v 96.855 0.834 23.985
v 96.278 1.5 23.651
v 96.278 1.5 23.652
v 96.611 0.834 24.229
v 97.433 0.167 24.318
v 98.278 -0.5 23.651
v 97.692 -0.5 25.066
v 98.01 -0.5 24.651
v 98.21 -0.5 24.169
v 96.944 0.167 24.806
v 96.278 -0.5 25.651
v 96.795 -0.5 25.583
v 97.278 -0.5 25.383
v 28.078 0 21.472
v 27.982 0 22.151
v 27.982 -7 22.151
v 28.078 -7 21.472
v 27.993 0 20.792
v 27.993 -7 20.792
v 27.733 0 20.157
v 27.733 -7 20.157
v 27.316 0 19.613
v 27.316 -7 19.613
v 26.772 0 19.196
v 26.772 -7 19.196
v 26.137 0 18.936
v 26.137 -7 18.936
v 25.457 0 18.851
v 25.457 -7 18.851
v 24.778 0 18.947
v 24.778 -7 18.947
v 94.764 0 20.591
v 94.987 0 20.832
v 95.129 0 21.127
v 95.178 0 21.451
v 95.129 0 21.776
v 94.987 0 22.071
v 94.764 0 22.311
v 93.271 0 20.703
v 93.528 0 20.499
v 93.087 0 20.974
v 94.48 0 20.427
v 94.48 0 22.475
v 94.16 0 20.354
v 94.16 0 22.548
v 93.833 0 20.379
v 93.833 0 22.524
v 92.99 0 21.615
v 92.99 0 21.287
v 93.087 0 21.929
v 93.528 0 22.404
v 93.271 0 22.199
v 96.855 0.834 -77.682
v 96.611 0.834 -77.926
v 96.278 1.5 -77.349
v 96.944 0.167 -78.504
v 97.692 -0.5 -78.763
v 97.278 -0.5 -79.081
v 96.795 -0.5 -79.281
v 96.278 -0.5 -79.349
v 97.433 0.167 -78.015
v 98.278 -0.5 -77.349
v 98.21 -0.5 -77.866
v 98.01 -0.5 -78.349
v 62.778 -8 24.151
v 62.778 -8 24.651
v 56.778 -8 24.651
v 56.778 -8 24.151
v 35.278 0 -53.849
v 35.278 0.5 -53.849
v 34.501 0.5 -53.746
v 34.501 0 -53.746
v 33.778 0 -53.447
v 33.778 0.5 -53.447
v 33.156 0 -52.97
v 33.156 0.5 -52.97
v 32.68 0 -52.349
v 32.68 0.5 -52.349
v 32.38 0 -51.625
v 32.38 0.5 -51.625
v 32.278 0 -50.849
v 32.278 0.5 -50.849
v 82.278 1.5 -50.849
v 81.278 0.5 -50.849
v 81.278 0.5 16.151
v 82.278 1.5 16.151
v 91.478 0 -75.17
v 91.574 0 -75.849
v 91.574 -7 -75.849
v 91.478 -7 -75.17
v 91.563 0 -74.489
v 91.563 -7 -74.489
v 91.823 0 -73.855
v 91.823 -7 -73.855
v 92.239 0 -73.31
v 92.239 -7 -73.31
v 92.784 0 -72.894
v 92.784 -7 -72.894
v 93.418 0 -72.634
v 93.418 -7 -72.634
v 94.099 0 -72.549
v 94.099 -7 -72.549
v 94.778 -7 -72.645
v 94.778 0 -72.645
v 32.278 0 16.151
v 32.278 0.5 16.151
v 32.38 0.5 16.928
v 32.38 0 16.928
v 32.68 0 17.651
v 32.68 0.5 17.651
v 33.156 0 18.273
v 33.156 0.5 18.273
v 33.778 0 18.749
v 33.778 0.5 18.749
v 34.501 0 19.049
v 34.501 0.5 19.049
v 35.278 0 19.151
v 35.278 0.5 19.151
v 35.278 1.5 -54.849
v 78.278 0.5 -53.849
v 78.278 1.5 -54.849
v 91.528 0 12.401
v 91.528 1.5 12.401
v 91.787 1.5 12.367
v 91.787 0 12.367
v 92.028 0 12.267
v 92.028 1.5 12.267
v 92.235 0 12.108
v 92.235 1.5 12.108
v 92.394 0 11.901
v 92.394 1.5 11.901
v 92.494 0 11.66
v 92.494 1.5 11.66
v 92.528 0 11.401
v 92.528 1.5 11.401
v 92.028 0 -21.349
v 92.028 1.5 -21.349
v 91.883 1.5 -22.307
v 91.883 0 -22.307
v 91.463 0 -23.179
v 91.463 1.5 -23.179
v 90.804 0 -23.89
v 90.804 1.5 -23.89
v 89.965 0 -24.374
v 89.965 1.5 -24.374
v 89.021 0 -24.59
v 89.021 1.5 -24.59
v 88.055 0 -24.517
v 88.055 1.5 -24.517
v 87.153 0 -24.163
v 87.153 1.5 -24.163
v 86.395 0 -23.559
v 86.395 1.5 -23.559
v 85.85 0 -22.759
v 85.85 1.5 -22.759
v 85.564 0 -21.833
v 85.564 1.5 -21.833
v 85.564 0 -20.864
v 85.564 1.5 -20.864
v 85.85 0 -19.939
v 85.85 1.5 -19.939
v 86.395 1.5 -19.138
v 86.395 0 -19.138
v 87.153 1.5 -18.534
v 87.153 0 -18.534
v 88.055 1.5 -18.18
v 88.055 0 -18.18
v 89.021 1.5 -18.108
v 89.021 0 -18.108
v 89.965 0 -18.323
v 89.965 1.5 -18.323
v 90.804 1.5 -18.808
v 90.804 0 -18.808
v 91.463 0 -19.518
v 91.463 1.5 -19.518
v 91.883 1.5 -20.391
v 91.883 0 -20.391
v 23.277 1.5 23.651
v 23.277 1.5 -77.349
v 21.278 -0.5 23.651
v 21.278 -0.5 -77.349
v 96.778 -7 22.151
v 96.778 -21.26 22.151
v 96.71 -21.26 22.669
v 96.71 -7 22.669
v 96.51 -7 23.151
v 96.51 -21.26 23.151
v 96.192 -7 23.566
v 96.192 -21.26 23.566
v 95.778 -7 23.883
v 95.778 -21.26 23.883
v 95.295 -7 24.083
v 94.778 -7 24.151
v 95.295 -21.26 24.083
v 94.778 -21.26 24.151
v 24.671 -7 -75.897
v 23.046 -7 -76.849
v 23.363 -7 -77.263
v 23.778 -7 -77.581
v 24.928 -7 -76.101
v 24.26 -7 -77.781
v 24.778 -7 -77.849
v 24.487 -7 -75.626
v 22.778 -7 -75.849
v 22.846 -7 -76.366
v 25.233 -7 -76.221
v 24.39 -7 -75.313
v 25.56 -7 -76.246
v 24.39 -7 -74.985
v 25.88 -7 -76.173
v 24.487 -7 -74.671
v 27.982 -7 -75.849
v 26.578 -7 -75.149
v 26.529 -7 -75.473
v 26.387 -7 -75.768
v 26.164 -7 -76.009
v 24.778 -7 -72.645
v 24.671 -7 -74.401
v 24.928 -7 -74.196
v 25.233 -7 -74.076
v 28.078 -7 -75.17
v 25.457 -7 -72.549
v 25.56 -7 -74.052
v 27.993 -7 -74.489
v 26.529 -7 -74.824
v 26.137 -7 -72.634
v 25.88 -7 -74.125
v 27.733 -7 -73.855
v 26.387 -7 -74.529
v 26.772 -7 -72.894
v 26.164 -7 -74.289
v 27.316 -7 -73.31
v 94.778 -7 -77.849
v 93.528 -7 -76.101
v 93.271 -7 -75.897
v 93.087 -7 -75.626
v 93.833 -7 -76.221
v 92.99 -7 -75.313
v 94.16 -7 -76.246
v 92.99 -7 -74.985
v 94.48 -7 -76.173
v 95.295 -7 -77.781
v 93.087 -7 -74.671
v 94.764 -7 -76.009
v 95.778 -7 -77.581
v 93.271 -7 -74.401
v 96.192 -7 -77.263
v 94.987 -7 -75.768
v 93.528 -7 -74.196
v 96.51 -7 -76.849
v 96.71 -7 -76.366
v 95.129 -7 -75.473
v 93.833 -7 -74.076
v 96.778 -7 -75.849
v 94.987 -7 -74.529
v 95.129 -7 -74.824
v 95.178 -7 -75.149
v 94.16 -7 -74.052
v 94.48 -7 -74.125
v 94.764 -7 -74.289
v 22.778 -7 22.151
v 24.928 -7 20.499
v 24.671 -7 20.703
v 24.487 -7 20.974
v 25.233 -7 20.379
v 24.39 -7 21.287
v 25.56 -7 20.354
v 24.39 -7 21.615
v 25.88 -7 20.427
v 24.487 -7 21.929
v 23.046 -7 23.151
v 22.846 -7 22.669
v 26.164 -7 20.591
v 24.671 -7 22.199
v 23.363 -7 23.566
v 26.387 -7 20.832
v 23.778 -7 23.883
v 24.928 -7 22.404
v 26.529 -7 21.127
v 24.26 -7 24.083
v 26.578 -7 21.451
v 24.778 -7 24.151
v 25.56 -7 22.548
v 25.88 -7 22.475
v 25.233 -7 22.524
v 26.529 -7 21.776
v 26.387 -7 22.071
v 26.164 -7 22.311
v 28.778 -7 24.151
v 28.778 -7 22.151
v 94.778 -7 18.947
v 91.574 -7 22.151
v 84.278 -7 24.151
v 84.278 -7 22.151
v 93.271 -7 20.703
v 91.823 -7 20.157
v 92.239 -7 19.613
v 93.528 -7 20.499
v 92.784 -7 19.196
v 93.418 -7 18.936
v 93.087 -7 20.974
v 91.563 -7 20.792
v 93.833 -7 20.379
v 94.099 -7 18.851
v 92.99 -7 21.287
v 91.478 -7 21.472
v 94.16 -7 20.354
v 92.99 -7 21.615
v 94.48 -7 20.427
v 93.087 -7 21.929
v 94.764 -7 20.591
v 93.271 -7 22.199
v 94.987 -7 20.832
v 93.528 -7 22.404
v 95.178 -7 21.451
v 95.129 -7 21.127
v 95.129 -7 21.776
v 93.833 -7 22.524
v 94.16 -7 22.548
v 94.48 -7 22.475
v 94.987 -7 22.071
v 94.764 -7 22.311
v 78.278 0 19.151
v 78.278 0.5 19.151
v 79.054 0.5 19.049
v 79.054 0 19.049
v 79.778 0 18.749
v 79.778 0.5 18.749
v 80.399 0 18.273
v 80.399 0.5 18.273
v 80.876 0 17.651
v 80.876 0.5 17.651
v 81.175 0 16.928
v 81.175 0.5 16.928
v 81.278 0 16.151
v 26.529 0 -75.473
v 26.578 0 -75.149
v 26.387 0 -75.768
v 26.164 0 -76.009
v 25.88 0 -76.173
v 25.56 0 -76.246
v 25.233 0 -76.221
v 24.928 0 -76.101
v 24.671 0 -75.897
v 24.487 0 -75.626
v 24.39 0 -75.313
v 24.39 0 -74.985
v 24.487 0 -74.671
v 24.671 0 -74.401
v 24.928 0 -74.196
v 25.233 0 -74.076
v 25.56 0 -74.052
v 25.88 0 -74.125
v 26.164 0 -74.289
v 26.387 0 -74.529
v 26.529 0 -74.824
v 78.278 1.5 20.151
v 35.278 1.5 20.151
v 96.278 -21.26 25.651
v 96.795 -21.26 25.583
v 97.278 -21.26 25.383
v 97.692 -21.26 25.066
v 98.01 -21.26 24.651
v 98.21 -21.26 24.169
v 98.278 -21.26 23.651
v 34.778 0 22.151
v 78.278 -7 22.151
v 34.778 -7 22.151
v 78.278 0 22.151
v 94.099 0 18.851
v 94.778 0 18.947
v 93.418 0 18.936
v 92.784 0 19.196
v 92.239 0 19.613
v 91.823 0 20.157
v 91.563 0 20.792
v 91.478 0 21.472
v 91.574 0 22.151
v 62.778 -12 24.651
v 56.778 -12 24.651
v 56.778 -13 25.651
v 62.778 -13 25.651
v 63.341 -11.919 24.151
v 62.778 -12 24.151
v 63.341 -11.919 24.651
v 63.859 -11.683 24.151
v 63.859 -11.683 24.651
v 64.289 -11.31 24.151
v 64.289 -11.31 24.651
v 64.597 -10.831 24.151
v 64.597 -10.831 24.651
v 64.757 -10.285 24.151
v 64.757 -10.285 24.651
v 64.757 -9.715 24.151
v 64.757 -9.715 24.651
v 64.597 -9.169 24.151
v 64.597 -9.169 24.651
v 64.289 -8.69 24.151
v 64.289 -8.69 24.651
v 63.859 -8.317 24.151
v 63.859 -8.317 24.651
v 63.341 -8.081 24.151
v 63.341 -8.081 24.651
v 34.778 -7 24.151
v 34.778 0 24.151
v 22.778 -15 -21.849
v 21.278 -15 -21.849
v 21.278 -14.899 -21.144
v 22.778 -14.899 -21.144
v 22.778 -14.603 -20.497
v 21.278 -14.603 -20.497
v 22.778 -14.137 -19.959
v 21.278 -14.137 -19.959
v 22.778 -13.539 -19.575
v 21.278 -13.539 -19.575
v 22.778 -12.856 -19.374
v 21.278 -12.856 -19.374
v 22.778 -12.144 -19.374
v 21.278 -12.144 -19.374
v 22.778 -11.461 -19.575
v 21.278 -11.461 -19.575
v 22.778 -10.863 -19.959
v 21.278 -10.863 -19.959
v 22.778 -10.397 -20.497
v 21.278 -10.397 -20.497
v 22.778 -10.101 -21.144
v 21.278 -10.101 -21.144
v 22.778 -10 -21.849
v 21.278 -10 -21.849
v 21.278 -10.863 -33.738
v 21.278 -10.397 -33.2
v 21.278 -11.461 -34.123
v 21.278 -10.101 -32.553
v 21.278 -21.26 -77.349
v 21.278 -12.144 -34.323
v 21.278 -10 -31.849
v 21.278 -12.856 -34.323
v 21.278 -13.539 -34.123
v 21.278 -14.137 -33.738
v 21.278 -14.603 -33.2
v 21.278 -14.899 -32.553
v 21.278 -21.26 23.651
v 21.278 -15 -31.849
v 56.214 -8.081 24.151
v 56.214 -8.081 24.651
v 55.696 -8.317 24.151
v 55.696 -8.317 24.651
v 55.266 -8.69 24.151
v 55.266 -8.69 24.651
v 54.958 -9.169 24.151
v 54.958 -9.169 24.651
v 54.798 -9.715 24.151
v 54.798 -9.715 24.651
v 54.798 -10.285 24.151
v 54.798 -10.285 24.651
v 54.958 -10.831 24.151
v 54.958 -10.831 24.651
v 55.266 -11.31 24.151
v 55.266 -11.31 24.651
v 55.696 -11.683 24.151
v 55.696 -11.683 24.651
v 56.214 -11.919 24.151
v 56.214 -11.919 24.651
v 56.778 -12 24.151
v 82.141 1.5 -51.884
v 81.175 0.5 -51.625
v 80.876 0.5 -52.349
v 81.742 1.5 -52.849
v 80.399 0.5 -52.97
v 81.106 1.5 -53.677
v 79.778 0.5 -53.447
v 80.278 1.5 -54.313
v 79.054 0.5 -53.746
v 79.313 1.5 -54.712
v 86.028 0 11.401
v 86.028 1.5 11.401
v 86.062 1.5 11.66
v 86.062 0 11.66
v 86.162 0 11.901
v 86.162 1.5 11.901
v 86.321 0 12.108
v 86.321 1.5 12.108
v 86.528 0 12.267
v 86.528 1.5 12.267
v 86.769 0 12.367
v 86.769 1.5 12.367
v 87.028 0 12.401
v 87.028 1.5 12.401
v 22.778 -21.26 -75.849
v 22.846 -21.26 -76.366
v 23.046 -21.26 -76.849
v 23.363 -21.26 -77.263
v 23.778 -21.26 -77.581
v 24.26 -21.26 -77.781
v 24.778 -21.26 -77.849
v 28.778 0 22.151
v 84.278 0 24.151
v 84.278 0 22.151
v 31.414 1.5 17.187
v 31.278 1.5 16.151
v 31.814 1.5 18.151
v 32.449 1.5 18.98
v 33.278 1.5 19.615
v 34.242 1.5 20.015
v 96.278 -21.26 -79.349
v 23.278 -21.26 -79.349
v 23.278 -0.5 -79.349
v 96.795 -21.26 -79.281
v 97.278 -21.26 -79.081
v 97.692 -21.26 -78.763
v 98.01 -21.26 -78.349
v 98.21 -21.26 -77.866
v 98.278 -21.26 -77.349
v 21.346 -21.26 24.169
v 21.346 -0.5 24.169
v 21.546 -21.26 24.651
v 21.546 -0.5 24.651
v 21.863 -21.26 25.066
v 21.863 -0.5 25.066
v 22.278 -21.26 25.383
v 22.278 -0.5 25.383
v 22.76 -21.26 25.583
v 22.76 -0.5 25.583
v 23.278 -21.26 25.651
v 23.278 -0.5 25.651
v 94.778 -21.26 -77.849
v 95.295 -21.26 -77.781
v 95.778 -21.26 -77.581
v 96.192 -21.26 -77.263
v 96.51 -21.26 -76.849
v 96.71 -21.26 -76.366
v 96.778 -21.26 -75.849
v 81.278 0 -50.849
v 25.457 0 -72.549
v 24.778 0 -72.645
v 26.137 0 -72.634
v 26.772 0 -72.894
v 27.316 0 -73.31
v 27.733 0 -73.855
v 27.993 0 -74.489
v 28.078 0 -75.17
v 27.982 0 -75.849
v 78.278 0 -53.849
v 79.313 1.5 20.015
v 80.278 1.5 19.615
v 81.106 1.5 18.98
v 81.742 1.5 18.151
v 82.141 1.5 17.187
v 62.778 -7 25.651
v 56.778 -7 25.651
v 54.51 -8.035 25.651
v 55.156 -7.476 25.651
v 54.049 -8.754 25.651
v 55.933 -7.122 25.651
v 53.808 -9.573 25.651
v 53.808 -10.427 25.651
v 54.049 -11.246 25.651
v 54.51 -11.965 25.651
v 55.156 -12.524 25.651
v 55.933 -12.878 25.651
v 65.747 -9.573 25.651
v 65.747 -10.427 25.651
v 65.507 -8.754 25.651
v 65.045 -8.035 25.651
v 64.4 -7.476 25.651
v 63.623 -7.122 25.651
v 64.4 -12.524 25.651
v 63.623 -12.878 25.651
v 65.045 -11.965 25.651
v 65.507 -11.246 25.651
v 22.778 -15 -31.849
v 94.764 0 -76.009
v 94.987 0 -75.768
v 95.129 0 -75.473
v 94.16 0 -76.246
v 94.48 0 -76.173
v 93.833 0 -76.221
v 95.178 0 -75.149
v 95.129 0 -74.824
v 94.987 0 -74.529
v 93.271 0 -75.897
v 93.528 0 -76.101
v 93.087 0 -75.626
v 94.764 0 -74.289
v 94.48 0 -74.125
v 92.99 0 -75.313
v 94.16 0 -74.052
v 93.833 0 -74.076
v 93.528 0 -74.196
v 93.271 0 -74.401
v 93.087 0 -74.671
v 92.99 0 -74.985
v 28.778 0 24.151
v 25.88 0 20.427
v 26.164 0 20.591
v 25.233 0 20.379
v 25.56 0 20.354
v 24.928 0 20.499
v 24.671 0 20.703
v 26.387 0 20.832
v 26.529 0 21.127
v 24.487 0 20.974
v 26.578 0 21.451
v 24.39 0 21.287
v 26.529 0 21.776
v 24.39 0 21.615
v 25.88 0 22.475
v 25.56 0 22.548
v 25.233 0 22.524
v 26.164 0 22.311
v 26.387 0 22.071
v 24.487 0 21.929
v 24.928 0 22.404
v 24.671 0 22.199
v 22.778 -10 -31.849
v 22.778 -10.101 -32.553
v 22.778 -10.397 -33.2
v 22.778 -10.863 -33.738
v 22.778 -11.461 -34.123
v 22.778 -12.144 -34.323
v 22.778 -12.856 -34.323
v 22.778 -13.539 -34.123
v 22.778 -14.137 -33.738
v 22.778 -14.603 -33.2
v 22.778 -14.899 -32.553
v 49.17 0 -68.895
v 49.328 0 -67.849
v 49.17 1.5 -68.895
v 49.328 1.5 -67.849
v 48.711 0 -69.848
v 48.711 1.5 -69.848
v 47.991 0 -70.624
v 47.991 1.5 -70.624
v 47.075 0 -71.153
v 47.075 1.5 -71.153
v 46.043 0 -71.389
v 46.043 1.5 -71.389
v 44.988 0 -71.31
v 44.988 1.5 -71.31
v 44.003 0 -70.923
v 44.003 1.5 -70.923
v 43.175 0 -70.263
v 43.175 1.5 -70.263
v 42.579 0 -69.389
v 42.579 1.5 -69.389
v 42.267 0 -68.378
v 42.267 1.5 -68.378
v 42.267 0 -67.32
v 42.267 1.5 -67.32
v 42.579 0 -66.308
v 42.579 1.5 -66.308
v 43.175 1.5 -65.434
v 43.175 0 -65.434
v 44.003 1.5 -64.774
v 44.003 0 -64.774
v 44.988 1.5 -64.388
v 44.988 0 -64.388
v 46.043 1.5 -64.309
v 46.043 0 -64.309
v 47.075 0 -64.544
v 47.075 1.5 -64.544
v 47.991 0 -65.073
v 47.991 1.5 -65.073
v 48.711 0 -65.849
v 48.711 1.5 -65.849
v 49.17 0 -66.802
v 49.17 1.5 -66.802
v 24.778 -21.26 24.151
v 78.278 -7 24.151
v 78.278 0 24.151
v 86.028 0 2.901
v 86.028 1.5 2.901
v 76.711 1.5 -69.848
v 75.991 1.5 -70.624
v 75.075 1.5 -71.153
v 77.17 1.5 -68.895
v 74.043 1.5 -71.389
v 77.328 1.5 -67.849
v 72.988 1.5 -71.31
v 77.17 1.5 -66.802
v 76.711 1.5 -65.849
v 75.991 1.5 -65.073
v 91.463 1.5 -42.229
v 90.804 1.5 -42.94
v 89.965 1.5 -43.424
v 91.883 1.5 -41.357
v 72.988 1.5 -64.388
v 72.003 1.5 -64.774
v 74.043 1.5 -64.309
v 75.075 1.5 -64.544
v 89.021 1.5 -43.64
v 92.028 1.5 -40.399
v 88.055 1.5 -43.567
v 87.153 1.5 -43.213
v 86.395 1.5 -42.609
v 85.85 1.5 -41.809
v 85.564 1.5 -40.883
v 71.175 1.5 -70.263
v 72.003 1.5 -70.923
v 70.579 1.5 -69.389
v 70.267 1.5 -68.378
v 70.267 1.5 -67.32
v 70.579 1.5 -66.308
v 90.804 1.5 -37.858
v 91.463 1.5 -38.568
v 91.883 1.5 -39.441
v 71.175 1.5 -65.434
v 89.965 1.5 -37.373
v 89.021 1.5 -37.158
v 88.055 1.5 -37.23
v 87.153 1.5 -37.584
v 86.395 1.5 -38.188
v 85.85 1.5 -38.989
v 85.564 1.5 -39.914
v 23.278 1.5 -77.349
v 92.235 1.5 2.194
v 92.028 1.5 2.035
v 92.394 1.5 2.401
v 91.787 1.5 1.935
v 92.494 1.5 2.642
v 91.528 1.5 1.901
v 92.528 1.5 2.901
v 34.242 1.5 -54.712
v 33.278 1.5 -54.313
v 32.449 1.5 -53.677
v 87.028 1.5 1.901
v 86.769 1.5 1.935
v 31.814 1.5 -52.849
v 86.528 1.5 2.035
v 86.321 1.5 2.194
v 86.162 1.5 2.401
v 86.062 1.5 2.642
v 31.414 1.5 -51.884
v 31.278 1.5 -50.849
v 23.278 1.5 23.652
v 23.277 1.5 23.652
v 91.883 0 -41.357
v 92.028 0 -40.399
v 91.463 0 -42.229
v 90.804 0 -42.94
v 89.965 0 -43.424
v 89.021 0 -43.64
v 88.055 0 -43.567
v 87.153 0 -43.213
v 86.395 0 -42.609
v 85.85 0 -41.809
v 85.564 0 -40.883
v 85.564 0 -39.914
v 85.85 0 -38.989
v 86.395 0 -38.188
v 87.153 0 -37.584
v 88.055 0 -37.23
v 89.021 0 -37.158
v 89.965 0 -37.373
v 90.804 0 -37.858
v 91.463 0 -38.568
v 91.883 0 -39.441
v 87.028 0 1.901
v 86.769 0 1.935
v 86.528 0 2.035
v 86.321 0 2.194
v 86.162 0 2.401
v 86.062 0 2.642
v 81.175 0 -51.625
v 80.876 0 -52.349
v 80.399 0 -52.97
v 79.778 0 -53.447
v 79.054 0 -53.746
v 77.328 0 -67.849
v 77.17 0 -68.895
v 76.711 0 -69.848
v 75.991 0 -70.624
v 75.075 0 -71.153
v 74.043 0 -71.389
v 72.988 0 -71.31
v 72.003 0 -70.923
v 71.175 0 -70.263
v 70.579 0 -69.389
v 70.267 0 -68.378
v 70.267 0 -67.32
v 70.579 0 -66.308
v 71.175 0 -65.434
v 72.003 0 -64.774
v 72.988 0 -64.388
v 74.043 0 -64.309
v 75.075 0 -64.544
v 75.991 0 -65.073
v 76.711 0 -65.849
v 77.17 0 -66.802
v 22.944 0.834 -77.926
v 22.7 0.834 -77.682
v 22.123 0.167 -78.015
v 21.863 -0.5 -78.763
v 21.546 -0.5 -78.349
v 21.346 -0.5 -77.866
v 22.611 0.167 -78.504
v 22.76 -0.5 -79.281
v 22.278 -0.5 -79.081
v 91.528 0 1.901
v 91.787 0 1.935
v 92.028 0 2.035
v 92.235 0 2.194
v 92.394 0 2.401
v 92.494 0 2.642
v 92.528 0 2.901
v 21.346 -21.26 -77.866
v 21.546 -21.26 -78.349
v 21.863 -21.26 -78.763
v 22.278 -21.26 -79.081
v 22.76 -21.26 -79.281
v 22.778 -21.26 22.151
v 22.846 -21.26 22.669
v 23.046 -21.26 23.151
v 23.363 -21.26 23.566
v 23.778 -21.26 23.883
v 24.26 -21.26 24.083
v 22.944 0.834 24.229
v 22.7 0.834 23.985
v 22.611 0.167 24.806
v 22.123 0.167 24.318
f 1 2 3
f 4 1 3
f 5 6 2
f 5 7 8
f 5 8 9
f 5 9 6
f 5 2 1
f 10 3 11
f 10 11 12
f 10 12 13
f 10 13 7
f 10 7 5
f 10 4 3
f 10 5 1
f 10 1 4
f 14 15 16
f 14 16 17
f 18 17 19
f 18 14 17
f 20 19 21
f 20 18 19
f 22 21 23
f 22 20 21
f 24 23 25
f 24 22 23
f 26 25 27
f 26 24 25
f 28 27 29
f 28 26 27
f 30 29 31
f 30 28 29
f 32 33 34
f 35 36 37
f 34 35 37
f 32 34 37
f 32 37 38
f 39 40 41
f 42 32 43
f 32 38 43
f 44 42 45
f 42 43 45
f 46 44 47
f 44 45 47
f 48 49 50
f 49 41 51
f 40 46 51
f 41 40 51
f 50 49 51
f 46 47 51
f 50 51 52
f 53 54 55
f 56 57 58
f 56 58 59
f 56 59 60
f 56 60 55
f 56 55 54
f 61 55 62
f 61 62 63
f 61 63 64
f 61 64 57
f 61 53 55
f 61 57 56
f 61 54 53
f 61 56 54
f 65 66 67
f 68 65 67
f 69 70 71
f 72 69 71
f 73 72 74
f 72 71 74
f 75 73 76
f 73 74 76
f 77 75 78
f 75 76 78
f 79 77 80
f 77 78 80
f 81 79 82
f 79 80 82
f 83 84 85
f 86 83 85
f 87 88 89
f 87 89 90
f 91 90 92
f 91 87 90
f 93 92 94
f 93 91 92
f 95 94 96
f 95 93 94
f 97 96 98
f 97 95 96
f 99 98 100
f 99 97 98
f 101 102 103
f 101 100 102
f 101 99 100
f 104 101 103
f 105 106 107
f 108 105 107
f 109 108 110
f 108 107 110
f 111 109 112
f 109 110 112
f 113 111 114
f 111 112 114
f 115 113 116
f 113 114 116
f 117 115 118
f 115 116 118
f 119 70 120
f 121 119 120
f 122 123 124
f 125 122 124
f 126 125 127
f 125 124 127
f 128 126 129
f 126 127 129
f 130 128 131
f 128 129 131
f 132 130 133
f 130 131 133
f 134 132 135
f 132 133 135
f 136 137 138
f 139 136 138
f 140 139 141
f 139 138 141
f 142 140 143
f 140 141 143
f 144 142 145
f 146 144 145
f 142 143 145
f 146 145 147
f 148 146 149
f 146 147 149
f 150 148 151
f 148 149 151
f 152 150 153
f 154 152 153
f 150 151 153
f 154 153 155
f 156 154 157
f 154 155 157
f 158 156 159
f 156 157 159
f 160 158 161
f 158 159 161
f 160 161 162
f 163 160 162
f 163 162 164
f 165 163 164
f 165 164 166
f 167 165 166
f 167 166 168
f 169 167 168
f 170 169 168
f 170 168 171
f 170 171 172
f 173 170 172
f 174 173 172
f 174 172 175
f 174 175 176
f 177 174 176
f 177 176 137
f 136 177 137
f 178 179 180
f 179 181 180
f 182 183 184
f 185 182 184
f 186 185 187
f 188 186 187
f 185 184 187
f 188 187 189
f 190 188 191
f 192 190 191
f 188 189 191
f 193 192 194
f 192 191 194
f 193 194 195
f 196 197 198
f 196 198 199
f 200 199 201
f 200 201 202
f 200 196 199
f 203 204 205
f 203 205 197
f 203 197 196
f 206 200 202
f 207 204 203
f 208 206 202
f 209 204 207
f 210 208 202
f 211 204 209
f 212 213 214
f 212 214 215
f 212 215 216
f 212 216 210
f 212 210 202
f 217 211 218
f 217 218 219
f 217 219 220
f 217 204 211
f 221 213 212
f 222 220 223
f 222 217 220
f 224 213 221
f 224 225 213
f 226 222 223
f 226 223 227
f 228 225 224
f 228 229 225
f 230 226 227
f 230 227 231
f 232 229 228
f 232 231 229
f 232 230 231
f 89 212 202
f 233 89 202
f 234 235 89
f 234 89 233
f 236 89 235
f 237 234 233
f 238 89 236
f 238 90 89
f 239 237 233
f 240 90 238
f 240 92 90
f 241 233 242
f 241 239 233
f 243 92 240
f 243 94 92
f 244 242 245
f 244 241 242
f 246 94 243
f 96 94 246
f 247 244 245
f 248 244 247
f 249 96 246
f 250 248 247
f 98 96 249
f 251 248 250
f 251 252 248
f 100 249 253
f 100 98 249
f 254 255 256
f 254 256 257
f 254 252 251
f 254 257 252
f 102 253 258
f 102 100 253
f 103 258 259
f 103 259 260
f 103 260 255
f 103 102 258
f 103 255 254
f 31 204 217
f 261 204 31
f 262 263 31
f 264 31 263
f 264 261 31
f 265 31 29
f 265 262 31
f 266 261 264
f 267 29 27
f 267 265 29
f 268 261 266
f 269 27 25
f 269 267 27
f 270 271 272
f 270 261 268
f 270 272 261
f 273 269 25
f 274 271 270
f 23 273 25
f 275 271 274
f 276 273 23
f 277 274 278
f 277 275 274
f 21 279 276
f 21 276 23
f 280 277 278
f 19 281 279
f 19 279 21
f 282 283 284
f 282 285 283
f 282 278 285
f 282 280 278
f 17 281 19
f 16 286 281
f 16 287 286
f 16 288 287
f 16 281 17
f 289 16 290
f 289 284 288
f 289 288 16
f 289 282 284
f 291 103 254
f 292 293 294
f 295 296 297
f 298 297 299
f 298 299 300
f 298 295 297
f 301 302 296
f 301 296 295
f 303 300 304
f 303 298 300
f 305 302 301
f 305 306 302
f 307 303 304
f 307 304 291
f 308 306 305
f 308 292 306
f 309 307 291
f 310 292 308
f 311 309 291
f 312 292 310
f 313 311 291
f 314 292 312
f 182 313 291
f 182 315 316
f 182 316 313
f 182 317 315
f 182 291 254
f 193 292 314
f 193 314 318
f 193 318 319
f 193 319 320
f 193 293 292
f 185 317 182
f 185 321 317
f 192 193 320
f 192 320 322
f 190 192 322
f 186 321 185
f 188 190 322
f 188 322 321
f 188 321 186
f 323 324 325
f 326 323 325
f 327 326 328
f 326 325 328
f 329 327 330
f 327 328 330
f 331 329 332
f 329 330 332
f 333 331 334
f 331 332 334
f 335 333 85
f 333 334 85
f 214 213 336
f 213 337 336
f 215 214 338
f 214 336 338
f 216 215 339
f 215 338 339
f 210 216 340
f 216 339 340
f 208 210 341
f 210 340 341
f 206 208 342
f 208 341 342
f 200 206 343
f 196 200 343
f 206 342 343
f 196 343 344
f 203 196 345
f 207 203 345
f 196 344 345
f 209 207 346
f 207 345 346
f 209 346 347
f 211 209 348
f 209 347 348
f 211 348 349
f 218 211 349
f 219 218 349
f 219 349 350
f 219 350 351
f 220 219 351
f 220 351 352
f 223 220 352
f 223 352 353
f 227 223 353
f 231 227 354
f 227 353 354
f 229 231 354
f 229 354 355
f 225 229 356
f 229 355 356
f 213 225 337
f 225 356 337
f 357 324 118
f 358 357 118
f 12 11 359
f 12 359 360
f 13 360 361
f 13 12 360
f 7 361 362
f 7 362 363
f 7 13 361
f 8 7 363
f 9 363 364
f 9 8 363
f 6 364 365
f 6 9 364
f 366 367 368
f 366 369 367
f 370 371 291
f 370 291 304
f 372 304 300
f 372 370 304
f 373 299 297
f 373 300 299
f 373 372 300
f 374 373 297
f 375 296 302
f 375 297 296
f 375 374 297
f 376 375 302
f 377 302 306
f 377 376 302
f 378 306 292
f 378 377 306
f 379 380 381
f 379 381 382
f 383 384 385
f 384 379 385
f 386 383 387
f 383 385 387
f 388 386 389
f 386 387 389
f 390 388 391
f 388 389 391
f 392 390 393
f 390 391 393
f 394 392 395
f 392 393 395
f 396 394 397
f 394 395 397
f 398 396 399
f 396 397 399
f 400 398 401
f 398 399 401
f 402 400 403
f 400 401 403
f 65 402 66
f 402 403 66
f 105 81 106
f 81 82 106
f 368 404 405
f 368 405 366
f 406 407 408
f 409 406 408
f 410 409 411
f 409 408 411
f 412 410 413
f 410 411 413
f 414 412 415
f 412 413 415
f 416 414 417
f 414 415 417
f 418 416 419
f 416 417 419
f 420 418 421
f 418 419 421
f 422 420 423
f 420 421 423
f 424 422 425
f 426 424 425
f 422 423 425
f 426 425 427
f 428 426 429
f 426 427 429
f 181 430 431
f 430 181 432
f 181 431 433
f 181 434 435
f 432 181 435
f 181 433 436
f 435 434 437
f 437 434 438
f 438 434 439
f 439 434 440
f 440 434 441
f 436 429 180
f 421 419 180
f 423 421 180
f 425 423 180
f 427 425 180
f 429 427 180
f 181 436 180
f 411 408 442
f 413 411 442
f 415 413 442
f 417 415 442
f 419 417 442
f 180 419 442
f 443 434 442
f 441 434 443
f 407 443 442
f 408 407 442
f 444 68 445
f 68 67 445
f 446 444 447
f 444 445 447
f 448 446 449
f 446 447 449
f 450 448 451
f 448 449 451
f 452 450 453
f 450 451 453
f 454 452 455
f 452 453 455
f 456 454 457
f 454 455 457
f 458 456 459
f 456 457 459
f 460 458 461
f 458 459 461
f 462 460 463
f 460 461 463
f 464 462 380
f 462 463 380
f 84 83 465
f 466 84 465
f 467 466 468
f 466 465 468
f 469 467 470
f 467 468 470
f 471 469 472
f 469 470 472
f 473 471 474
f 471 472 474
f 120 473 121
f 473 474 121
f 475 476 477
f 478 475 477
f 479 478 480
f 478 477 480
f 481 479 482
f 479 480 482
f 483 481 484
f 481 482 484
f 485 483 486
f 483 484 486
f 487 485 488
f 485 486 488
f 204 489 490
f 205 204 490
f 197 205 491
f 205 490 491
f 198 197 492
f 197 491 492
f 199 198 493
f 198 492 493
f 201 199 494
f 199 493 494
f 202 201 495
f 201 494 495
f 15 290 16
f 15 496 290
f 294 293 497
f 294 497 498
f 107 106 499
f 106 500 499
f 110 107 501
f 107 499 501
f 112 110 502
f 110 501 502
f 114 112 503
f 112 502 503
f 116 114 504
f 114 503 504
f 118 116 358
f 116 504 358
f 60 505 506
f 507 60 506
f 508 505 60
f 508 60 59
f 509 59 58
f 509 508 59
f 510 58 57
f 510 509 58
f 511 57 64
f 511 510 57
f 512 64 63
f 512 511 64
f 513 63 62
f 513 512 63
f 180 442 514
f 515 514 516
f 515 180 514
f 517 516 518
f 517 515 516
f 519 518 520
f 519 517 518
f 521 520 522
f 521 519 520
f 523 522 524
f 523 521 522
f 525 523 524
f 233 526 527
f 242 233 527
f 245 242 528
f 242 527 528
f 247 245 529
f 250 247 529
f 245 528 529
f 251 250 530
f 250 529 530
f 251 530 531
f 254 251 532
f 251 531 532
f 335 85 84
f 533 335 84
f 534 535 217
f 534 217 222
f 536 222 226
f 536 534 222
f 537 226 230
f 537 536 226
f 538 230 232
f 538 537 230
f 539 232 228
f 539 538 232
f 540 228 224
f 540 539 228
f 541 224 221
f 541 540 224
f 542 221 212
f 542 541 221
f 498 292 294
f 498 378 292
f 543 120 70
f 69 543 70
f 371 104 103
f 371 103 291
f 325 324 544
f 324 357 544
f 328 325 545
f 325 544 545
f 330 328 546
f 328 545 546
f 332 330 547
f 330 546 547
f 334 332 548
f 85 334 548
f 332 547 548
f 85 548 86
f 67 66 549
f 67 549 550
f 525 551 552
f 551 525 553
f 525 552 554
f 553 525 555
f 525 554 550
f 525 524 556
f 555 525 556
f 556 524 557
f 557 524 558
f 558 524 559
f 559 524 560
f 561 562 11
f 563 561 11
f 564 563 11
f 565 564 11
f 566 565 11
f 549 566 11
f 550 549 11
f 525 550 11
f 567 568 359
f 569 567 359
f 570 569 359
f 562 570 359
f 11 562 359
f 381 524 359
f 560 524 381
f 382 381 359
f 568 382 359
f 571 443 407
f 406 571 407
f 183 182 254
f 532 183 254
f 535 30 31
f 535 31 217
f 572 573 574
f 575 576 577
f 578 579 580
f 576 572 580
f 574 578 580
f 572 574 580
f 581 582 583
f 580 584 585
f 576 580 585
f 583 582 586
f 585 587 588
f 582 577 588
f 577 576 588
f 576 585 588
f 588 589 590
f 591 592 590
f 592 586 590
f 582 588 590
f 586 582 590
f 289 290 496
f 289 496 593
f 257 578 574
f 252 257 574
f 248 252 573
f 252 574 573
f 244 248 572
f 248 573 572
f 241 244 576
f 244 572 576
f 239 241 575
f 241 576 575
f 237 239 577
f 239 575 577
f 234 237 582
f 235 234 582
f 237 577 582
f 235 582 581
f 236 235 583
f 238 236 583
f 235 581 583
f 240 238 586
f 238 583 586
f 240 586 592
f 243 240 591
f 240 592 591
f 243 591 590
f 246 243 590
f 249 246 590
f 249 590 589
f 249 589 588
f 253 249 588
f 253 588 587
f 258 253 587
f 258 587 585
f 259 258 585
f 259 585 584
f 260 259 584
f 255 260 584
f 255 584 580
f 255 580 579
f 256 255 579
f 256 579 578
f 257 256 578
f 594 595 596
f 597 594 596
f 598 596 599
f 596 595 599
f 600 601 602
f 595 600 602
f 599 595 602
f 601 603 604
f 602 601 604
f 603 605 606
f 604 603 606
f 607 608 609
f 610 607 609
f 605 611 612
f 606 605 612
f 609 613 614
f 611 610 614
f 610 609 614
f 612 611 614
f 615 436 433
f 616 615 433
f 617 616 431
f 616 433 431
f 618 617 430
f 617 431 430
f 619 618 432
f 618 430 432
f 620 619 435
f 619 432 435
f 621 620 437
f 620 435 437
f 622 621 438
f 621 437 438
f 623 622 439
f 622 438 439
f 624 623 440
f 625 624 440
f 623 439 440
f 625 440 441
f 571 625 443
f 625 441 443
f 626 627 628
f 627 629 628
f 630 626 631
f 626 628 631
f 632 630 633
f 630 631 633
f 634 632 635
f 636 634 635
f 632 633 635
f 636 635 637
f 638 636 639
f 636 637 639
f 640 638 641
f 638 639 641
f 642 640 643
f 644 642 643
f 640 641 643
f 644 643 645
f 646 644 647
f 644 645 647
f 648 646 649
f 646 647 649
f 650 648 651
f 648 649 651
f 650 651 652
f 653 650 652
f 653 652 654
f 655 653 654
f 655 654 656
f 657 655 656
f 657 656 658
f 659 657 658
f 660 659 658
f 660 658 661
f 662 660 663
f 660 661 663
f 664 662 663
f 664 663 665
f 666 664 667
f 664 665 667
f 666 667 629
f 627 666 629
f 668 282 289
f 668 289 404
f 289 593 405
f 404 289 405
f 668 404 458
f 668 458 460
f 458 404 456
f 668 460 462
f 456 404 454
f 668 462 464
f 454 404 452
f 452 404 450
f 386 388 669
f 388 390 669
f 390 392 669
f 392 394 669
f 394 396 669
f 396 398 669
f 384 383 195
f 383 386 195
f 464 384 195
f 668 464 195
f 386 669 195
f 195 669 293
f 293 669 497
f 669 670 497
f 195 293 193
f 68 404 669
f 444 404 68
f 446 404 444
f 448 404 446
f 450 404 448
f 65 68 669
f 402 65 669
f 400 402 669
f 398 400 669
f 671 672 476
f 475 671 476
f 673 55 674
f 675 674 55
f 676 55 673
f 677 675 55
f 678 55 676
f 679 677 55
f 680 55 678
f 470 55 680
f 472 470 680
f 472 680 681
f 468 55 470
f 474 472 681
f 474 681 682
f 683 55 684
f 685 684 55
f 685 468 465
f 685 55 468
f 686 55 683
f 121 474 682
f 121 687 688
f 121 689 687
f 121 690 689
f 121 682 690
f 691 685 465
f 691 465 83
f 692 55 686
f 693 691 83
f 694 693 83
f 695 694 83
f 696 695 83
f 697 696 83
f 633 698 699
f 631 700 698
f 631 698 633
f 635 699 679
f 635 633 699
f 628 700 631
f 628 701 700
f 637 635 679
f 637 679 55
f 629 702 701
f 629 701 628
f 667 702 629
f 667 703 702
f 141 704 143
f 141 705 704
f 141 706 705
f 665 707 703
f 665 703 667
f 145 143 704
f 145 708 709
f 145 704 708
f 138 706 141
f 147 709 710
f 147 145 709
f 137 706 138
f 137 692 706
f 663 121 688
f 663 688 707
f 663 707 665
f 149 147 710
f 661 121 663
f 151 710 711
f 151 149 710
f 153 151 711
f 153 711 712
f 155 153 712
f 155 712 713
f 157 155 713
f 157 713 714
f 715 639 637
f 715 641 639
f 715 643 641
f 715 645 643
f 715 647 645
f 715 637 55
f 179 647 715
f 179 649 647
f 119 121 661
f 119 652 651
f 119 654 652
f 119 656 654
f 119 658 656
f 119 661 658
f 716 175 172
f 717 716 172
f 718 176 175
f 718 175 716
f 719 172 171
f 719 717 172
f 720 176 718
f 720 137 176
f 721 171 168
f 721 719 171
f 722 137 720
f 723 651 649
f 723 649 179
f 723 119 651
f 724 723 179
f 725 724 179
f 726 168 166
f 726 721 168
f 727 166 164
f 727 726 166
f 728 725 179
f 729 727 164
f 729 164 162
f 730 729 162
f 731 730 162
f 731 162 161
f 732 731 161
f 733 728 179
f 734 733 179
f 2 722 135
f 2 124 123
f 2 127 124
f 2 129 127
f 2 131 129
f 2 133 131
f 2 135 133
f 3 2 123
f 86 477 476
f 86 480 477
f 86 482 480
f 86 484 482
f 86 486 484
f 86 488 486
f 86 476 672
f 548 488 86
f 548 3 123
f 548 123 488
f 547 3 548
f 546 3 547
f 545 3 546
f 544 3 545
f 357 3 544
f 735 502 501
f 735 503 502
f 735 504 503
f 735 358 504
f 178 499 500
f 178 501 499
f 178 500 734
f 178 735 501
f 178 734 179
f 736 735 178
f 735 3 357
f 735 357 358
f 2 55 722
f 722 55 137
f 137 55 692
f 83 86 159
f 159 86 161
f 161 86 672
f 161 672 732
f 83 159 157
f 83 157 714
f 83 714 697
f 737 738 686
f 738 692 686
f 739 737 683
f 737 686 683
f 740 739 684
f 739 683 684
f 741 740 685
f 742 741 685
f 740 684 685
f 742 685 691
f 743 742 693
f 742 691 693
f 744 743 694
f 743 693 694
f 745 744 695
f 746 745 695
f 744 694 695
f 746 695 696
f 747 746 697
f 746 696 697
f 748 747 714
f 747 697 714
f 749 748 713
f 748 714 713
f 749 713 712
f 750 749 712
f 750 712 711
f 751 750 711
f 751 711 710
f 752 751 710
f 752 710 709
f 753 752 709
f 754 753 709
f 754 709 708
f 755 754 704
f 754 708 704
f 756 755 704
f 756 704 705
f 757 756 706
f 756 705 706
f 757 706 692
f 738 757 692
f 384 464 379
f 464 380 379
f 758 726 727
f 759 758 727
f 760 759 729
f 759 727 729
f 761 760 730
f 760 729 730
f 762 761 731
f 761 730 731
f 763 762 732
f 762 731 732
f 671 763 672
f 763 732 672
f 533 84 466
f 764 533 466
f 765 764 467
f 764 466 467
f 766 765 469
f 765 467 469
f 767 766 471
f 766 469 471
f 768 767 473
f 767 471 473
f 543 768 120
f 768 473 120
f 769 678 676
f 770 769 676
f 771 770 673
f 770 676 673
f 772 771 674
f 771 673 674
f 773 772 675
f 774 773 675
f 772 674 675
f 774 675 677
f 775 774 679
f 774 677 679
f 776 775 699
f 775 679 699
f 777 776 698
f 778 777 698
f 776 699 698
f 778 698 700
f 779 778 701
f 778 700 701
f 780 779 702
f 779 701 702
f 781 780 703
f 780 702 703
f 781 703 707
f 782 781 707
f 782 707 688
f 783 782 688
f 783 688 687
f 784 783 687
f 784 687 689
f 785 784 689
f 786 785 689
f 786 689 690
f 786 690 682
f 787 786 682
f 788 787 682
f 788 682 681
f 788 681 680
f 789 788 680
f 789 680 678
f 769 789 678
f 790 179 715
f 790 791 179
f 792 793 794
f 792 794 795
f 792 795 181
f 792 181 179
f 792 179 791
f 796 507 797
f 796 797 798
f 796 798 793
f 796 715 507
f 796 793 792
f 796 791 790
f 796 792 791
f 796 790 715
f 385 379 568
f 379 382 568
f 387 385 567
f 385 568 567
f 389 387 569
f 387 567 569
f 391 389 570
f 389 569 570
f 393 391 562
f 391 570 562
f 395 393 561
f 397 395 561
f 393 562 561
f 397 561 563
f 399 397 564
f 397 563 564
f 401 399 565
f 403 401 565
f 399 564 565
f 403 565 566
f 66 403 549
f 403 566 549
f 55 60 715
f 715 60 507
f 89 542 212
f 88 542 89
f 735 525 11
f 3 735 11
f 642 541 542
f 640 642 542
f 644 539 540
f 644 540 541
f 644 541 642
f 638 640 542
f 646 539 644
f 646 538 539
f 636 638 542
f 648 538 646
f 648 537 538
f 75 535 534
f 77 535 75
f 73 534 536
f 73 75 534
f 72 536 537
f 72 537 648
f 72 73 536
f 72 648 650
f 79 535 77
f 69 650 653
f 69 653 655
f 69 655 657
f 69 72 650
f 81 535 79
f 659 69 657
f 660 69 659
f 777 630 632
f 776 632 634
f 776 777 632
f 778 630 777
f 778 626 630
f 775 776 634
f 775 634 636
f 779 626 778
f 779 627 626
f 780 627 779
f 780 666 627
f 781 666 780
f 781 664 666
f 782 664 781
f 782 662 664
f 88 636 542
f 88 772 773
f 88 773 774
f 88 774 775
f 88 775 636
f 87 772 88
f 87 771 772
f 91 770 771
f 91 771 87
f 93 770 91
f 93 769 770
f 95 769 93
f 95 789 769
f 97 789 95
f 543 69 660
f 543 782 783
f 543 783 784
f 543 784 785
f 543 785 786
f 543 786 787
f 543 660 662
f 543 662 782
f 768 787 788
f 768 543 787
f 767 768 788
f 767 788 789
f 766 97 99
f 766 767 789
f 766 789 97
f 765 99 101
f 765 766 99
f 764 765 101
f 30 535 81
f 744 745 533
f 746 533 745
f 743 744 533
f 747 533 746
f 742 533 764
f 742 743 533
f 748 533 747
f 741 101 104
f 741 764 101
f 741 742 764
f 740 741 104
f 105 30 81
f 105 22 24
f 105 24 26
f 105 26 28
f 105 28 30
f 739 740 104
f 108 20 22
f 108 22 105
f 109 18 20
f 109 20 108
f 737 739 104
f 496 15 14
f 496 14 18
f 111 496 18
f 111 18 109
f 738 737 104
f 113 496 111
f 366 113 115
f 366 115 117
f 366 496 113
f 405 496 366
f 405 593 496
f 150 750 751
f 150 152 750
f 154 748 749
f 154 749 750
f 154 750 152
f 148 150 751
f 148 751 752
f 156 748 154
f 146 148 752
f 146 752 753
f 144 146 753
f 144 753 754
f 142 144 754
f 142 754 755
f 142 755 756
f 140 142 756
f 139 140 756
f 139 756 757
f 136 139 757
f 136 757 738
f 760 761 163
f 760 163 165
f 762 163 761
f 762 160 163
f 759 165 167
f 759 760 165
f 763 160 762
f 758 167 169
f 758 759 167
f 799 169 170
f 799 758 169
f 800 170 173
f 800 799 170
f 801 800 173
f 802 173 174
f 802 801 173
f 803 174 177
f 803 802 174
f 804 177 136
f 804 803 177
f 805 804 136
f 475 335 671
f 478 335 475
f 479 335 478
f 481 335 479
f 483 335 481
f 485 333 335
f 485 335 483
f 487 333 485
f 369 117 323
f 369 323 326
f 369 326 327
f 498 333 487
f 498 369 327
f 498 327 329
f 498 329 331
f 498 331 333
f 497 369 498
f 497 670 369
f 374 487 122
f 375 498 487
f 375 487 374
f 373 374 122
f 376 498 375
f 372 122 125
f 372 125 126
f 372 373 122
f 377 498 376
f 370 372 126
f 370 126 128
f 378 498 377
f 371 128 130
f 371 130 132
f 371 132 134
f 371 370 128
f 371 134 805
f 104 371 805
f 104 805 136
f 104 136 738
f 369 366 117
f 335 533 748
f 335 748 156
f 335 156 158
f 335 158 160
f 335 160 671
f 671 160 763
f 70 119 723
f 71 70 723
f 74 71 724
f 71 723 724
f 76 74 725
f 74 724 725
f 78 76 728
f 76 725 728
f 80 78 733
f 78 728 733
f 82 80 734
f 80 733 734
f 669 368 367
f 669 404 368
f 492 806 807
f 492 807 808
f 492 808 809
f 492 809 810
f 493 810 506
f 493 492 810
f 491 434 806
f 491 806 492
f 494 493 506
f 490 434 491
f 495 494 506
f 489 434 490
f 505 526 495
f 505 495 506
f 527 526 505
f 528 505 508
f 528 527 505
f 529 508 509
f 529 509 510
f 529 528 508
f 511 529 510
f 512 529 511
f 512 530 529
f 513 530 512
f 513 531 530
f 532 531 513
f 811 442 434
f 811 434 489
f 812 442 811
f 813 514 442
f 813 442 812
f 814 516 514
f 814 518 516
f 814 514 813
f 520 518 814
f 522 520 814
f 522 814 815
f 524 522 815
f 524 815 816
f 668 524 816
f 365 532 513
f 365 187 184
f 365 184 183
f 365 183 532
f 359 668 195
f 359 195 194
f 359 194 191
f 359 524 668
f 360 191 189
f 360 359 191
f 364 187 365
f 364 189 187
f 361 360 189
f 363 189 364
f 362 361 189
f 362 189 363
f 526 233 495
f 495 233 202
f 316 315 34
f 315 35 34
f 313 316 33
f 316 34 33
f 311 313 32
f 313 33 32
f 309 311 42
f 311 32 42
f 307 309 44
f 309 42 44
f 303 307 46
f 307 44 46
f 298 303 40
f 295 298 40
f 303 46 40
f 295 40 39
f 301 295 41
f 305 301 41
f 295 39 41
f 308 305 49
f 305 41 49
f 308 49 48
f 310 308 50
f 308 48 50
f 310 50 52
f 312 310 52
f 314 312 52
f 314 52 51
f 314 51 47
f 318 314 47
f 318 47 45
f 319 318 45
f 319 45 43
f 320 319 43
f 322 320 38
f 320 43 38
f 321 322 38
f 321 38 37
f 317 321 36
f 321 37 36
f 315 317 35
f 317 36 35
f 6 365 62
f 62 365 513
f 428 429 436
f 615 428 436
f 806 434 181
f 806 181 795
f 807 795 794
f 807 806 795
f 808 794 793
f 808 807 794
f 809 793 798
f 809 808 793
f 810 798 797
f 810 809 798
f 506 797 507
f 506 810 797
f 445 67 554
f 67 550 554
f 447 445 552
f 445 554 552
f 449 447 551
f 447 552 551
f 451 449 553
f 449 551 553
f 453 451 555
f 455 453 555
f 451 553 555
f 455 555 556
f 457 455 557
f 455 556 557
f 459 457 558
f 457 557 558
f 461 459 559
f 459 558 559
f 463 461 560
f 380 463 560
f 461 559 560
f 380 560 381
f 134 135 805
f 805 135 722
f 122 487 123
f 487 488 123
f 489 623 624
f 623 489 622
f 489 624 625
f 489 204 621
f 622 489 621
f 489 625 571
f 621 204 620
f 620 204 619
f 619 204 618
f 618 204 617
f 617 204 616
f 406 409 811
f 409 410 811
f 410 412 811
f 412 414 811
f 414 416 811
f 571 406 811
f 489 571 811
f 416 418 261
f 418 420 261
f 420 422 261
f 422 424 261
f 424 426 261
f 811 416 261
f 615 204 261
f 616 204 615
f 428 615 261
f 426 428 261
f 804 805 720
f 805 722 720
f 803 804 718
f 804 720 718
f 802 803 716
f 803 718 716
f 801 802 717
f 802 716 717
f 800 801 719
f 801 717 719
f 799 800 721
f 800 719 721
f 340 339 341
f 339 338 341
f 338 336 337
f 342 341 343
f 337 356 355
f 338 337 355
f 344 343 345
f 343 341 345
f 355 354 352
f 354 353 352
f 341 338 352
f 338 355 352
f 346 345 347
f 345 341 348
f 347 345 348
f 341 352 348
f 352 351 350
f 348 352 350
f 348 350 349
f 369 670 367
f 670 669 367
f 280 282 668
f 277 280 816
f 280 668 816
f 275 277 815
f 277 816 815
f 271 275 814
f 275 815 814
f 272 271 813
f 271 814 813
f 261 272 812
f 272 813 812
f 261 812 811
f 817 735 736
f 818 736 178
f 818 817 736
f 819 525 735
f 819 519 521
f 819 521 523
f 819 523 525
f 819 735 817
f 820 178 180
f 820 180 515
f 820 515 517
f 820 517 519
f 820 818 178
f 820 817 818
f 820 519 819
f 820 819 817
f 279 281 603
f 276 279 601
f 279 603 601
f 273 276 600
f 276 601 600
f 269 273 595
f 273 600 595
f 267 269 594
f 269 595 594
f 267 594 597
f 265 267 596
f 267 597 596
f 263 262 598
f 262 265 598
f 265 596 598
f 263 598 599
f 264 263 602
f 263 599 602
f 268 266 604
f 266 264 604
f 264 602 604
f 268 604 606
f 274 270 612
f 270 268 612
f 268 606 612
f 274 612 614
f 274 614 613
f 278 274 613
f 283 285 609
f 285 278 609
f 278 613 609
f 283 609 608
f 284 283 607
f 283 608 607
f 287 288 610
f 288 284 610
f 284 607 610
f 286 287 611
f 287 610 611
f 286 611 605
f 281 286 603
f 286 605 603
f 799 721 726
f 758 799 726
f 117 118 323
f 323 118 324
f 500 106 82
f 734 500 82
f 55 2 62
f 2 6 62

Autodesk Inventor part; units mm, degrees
ref_plane "YZ Plane" through (0, 0, 0) normal (1, 0, 0) x (0, 1, 0)
ref_plane "XZ Plane" through (0, 0, 0) normal (0, 1, 0) x (-1, 0, 0)
ref_plane "XY Plane" through (0, 0, 0) normal (0, 0, 1) x (1, 0, 0)
sketch "Sketch1" plane through (0, 0, 0) normal (0, 1, 0) x (-1, 0, 0)
  line L0 (-21.2777, 25.6513) -> (-98.2777, 25.6513)
  line L1 (-98.2777, 25.6513) -> (-98.2777, -79.3487)
  line L2 (-98.2777, -79.3487) -> (-21.2777, -79.3487)
  line L3 (-21.2777, -79.3487) -> (-21.2777, 25.6513)
  point P0 (0, 0)
  dimension "d0" = 77
  dimension "d42" = 105
extrude "Extrusion1" add sketch "Sketch1" along normal blind 1.5
sketch "Sketch5" plane through (0, 0, 0) normal (0, -1, 0) x (1, 0, 0)
  line L0 (98.2777, 25.6513) -> (98.2777, -79.3487) projected
  line L1 (21.2777, 25.6513) -> (98.2777, 25.6513) projected
  line L2 (21.2777, -79.3487) -> (21.2777, 25.6513) projected
  line L3 (98.2777, -79.3487) -> (21.2777, -79.3487) projected
  line L4 (96.7777, 24.1513) -> (96.7777, -77.8487)
  line L5 (96.7777, -77.8487) -> (22.7777, -77.8487)
  line L6 (22.7777, -77.8487) -> (22.7777, 24.1513)
  line L7 (22.7777, 24.1513) -> (96.7777, 24.1513)
  point P0 (0, 0)
  dimension "d26" = 1.5
extrude "Extrusion7" add sketch "Sketch5" along normal blind 21.26
fillet "Fillet2" radius 2 4 edges at (21.2777, -9.88, -79.3487) (98.2777, -9.88, -79.3487) (98.2777, -9.88, 25.6513) (21.2777, -9.88, 25.6513)
sketch "Sketch8" plane through (21.2777, -21.26, -77.3487) normal (-1, 0, 0) x (0, 0, 1)
  line L0 (55.5, 8.76) -> (45.5, 8.76) construction
  line L1 (55.5, 11.26) -> (45.5, 11.26)
  line L2 (45.5, 6.26) -> (55.5, 6.26)
  arc A0 (55.5, 6.26) -> (55.5, 11.26) centre (55.5, 8.76) ccw
  arc A1 (45.5, 11.26) -> (45.5, 6.26) centre (45.5, 8.76) ccw
  line L3 (101, 0) -> (0, 0) projected
  line L4 (101, 0) -> (0, 0) construction
  line L5 (46.5661, 0) -> (44.4339, 17.52) construction
  line L6 (0, 22.76) -> (101, 22.76) projected
  line L7 (0, 22.76) -> (101, 22.76) construction
  line L8 (0, 0) -> (0, 22.76) construction
  line L9 (101, 22.76) -> (101, 0) projected
  line L10 (0, 0) -> (0, 22.76) projected
  circle A2 centre (50.054, 7.7768) radius 1.7526 projected
  point P0 (50.5, 8.76)
  point P1 (50.5, 8.76)
  dimension "d2" = 1.5
  dimension "d51" = 10
  dimension "d52" = 5
  dimension "d282" = 14
extrude "Extrusion9" cut sketch "Sketch8" against normal blind 10 contours A0 L2 A2 A1 L1 | L2 A2 picked at (50.5802, 7.7897)
sketch "Sketch9" plane through (0, 1.5, 0) normal (0, 1, 0) x (1, 0, 0)
  line L0 (35.2777, -19.1513) -> (78.2777, -19.1513)
  line L1 (81.2777, -16.1513) -> (81.2777, 50.8487)
  line L2 (78.2777, 53.8487) -> (35.2777, 53.8487)
  line L3 (32.2777, 50.8487) -> (32.2777, -16.1513)
  arc A0 (32.2777, -16.1513) -> (35.2777, -19.1513) centre (35.2777, -16.1513) ccw
  arc A1 (78.2777, -19.1513) -> (81.2777, -16.1513) centre (78.2777, -16.1513) ccw
  arc A2 (81.2777, 50.8487) -> (78.2777, 53.8487) centre (78.2777, 50.8487) ccw
  arc A3 (35.2777, 53.8487) -> (32.2777, 50.8487) centre (35.2777, 50.8487) ccw
  line L4 (98.2777, -25.6513) -> (98.2777, 79.3487) projected
  line L5 (21.2777, -25.6513) -> (98.2777, -25.6513) projected
  line L6 (22.7777, -24.1513) -> (22.7777, 77.8487) projected
  point P0 (0, 0)
  point P1 (81.2777, 53.8487)
  point P2 (81.2777, -19.1513)
  point P3 (32.2777, 53.8487)
  point P4 (98.2777, -23.6513)
  point P5 (98.2777, 77.3487)
  point P6 (23.2777, -25.6513)
  point P7 (96.2777, -25.6513)
  dimension "d56" = 49
  dimension "d57" = 73
  dimension "d60" = 3
  dimension "d116" = 17
  dimension "d144" = 6.5
  dimension "d283" = 9.5
extrude "Extrusion10" cut sketch "Sketch9" against normal blind 10
chamfer "Chamfer4" distance 1 angle 45 8 edges at (33.1563, 1.5, 18.2726) (32.2777, 1.5, -17.3487) (33.1563, 1.5, -52.9701) (56.7777, 1.5, -53.8487) (80.399, 1.5, -52.9701) (81.2777, 1.5, -17.3487) (80.399, 1.5, 18.2726) (56.7777, 1.5, 19.1513)
chamfer "Chamfer5" distance 2 angle 45 8 edges at (98.2777, 1.5, -26.8487) (97.6919, 1.5, -78.763) (59.7777, 1.5, -79.3487) (21.8635, 1.5, -78.763) (21.2777, 1.5, -26.8487) (21.8635, 1.5, 25.0655) (59.7777, 1.5, 25.6513) (97.6919, 1.5, 25.0655)
sketch "Sketch17" plane through (23.2777, -21.26, 25.6513) normal (0, 0, 1) x (1, 0, 0)
  line L0 (0, 20.76) -> (73, 20.76) projected
  line L1 (73, 0) -> (0, 0) projected
  line L2 (33.5, 11.26) -> (39.5, 11.26) construction
  line L3 (33.5, 9.26) -> (39.5, 9.26)
  line L4 (39.5, 13.26) -> (33.5, 13.26)
  arc A0 (33.5, 13.26) -> (33.5, 9.26) centre (33.5, 11.26) ccw
  arc A1 (39.5, 9.26) -> (39.5, 13.26) centre (39.5, 11.26) ccw
  line L5 (0, 0) -> (0, 20.76) projected
  line L6 (73, 20.76) -> (73, 0) projected
  point P0 (-23.2777, 21.26)
  point P1 (36.5, 11.26)
  dimension "d167" = 6
  dimension "d168" = 4
  dimension "d169" = 9.5
  dimension "d170" = 11.26
extrude "Extrusion17" cut sketch "Sketch17" against normal blind 4 contours A0 L4 A1 L3
chamfer "Chamfer6" distance 1 angle 45 4 edges at (59.7777, -8, 25.6513) (64.7777, -10, 25.6513) (59.7777, -12, 25.6513) (54.7777, -10, 25.6513)
sketch "Sketch18" plane through (0, 1.5, 0) normal (0, 1, 0) x (1, 0, 0)
  line L0 (96.2777, 77.3487) -> (96.2777, -23.6513) projected
  line L1 (82.2777, -16.1513) -> (96.2777, -16.1513)
  line L2 (81.2777, 50.8487) -> (82.2777, 50.8487) projected
  line L3 (96.7777, -24.1513) -> (96.7777, 77.8487) projected
  circle A0 centre (88.7777, 21.3487) radius 3.25
  circle A1 centre (88.7777, 40.3987) radius 3.25
  line L4 (96.2777, -23.6513) -> (23.2777, -23.6513) projected
  point P0 (0, 0)
  point P1 (96.7777, -22.1513)
  point P2 (96.7777, 75.8487)
  point P3 (97.2777, 77.3487)
  point P4 (97.2777, -26.6513)
  dimension "d178" = 6.5
  dimension "d179" = 6.5
  dimension "d191" = 7.5
  dimension "d192" = 7.5
  dimension "d275" = 19.05
  dimension "d276" = 45
extrude "Extrusion18" cut sketch "Sketch18" against normal blind 10
sketch "Sketch19" plane through (0, 1.5, 0) normal (0, 1, 0) x (1, 0, 0)
  circle A0 centre (88.7777, 40.3987) radius 3.25 projected
  circle A1 centre (88.7777, 21.3487) radius 3.25 projected
  arc A2 (31.2777, -16.1513) -> (35.2777, -20.1513) centre (35.2777, -16.1513) ccw projected
  line L0 (31.2777, 50.8487) -> (31.2777, -16.1513) projected
  arc A3 (35.2777, 54.8487) -> (31.2777, 50.8487) centre (35.2777, 50.8487) ccw projected
  line L1 (78.2777, 54.8487) -> (35.2777, 54.8487) projected
  arc A4 (82.2777, 50.8487) -> (78.2777, 54.8487) centre (78.2777, 50.8487) ccw projected
  line L2 (82.2777, -16.1513) -> (82.2777, 50.8487) projected
  arc A5 (78.2777, -20.1513) -> (82.2777, -16.1513) centre (78.2777, -16.1513) ccw projected
  line L3 (35.2777, -20.1513) -> (78.2777, -20.1513) projected
  line L4 (96.2777, -23.6513) -> (23.2777, -23.6513) projected
  line L5 (96.2777, 77.3487) -> (96.2777, -23.6513) projected
  line L6 (23.2777, 77.3487) -> (96.2777, 77.3487) projected
  line L7 (23.2777, -23.6513) -> (23.2777, 77.3487) projected
  arc A6 (35.2777, 54.8487) -> (31.2777, 50.8487) centre (35.2777, 50.8487) ccw projected
  arc A7 (82.2777, 50.8487) -> (78.2777, 54.8487) centre (78.2777, 50.8487) ccw projected
  line L8 (23.2777, 77.3487) -> (96.2777, 77.3487) projected
  circle A8 centre (73.7777, 67.8487) radius 3.55
  line L9 (96.2777, 77.3487) -> (96.2777, -23.6513) projected
  line L10 (81.2777, -16.1513) -> (81.2777, 50.8487) projected
  line L11 (88.7777, 40.3987) -> (88.7777, 73.4928)
  line L12 (96.7777, 75.8487) -> (96.7777, -22.1513) projected
  line L13 (24.7777, 77.8487) -> (94.7777, 77.8487) projected
  line L14 (82.2777, -16.1513) -> (82.2777, 50.8487) projected
  line L15 (82.2777, 43.5388) -> (96.2777, 43.5388)
  line L16 (87.0277, -12.4013) -> (91.5277, -12.4013)
  line L17 (92.5277, -11.4013) -> (92.5277, -2.9013)
  line L18 (91.5277, -1.9013) -> (87.0277, -1.9013)
  line L19 (86.0277, -2.9013) -> (86.0277, -11.4013)
  line L20 (86.0277, -12.4013) -> (92.5277, -1.9013) construction
  line L21 (92.5277, -12.4013) -> (86.0277, -1.9013) construction
  arc A9 (86.0277, -11.4013) -> (87.0277, -12.4013) centre (87.0277, -11.4013) ccw
  arc A10 (91.5277, -12.4013) -> (92.5277, -11.4013) centre (91.5277, -11.4013) ccw
  arc A11 (92.5277, -2.9013) -> (91.5277, -1.9013) centre (91.5277, -2.9013) ccw
  arc A12 (87.0277, -1.9013) -> (86.0277, -2.9013) centre (87.0277, -2.9013) ccw
  line L22 (77.1824, 62.3487) -> (70.6824, 72.8487) construction
  line L23 (35.0277, 59.5987) -> (41.5277, 70.0987) construction
  line L24 (98.2777, -23.6513) -> (98.2777, 77.3487) projected
  circle A13 centre (45.7777, 67.8487) radius 3.55
  line L25 (22.7777, -24.1513) -> (96.7777, -24.1513) projected
  point P0 (0, 0)
  point P1 (86.949, 59.6109)
  point P2 (88.2777, 58.5987)
  point P3 (89.2777, -7.1513)
  point P4 (98.2777, -25.6513)
  point P5 (98.2777, 79.3487)
  dimension "d184" = 7.1
  dimension "d200" = 10.5
  dimension "d201" = 1
  dimension "d207" = 6.5
  dimension "d209" = 5.75
  dimension "d277" = 7.1
  dimension "d278" = 28
  dimension "d284" = 9.5
  dimension "d285" = 9.5
  dimension "d286" = 22.5
  dimension "d318" = 17
extrude "Extrusion19" cut sketch "Sketch19" against normal up to surface (1.5 mm away) contours A8 | A9 L19 A12 L18 A11 L17 A10 L16 | A13
sketch "Sketch34" plane through (0, 0, 0) normal (0, -1, 0) x (1, 0, 0)
  circle A0 centre (25.4777, 21.4513) radius 1.1
  circle A1 centre (25.4777, -75.1487) radius 1.1
  circle A2 centre (94.0777, -75.1487) radius 1.1
  circle A3 centre (94.0777, 21.4513) radius 1.1
  line L0 (22.7777, 24.1513) -> (96.7777, 24.1513) projected
  line L1 (96.7777, 24.1513) -> (96.7777, -77.8487) projected
  line L2 (22.7777, -14.9487) -> (22.7777, -38.7487)
  line L3 (96.7777, -77.8487) -> (22.7777, -77.8487) projected
  line L4 (22.7777, 24.1513) -> (22.7777, -77.8487) projected
  line L5 (24.7777, -75.8487) -> (94.7777, -75.8487)
  line L6 (94.7777, -75.8487) -> (94.7777, 22.1513)
  line L7 (94.7777, 22.1513) -> (24.7777, 22.1513)
  line L8 (24.7777, 22.1513) -> (24.7777, -75.8487)
  circle A4 centre (25.4777, -75.1487) radius 2.6
  circle A5 centre (25.4777, 21.4513) radius 2.6
  circle A6 centre (94.0777, -75.1487) radius 2.6
  circle A7 centre (94.0777, 21.4513) radius 2.6
  point P0 (0, 0)
  point P1 (27.4777, 19.4513)
  point P2 (92.0777, -73.1487)
  point P3 (24.7777, -72.6447)
  point P4 (24.7777, 18.9473)
  point P5 (27.9817, 22.1513)
  point P6 (91.5737, 22.1513)
  point P7 (94.7777, 18.9473)
  point P8 (94.7777, -72.6447)
  point P9 (91.5737, -75.8487)
  point P10 (27.9817, -75.8487)
  dimension "d361" = 2.2
  dimension "d362" = 2.2
  dimension "d363" = 2.2
  dimension "d364" = 2.2
  dimension "d367" = 2
  dimension "d368" = 1.5
  dimension "d369" = 1.5
  dimension "d370" = 1.5
  dimension "d371" = 1.5
fillet "Fillet6" radius 2 4 edges at (22.7777, -10.63, -77.8487) (22.7777, -10.63, 24.1513) (96.7777, -10.63, 24.1513) (96.7777, -10.63, -77.8487)
extrude "Extrusion31" add sketch "Sketch34" along normal blind 7 contours A0 L7 A5 L8 | A0 L8 A5 L7 | A7 L6 A3 L7 | L7 A3 L6 A7 | A4 L5 A1 L8 | L8 A1 L5 A4 | A6 L5 A2 L6 | L6 A2 L5 A6 | L0 L1 L3 L4 L2
sketch "Sketch35" plane through (0, -7, 0) normal (0, -1, 0) x (1, 0, 0)
  circle A0 centre (94.0777, 21.4513) radius 1.1 projected
  circle A1 centre (94.0777, -75.1487) radius 1.1 projected
  circle A2 centre (25.4777, 21.4513) radius 1.1 projected
  circle A3 centre (25.4777, -75.1487) radius 1.1 projected
  line L0 (24.7777, -72.6447) -> (24.7777, 18.9473) projected
  arc A4 (24.7777, 18.9473) -> (27.9817, 22.1513) centre (25.4777, 21.4513) ccw projected
  line L1 (27.9817, 22.1513) -> (91.5737, 22.1513) projected
  arc A5 (91.5737, 22.1513) -> (94.7777, 18.9473) centre (94.0777, 21.4513) ccw projected
  line L2 (94.7777, 18.9473) -> (94.7777, -72.6447) projected
  arc A6 (94.7777, -72.6447) -> (91.5737, -75.8487) centre (94.0777, -75.1487) ccw projected
  line L3 (91.5737, -75.8487) -> (27.9817, -75.8487) projected
  arc A7 (27.9817, -75.8487) -> (24.7777, -72.6447) centre (25.4777, -75.1487) ccw projected
  arc A8 (22.7777, -75.8487) -> (24.7777, -77.8487) centre (24.7777, -75.8487) ccw projected
  line L4 (94.7777, -77.8487) -> (24.7777, -77.8487) projected
  arc A9 (94.7777, -77.8487) -> (96.7777, -75.8487) centre (94.7777, -75.8487) ccw projected
  line L5 (96.7777, 22.1513) -> (96.7777, -75.8487) projected
  arc A10 (96.7777, 22.1513) -> (94.7777, 24.1513) centre (94.7777, 22.1513) ccw projected
  line L6 (24.7777, 24.1513) -> (94.7777, 24.1513) projected
  arc A11 (24.7777, 24.1513) -> (22.7777, 22.1513) centre (24.7777, 22.1513) ccw projected
  line L7 (22.7777, -75.8487) -> (22.7777, 22.1513) projected
  line L8 (24.7777, 24.1513) -> (94.7777, 24.1513) projected
  line L9 (34.7777, 24.1513) -> (34.7777, 22.1513)
  line L10 (27.9817, 22.1513) -> (91.5737, 22.1513) projected
  line L11 (28.7777, 22.1513) -> (28.7777, 24.1513)
  line L12 (84.2777, 24.1513) -> (84.2777, 22.1513)
  line L13 (78.2777, 24.1513) -> (78.2777, 22.1513)
  point P0 (0, 0)
  dimension "d372" = 6
  dimension "d373" = 6
  dimension "d374" = 6
  dimension "d375" = 10.5
extrude "Extrusion32" cut sketch "Sketch35" against normal up to surface (7 mm away) contours L11 L6 L9 L1 | L13 L6 L12 L1
properties part number "Frontpanel_3DPrint"
